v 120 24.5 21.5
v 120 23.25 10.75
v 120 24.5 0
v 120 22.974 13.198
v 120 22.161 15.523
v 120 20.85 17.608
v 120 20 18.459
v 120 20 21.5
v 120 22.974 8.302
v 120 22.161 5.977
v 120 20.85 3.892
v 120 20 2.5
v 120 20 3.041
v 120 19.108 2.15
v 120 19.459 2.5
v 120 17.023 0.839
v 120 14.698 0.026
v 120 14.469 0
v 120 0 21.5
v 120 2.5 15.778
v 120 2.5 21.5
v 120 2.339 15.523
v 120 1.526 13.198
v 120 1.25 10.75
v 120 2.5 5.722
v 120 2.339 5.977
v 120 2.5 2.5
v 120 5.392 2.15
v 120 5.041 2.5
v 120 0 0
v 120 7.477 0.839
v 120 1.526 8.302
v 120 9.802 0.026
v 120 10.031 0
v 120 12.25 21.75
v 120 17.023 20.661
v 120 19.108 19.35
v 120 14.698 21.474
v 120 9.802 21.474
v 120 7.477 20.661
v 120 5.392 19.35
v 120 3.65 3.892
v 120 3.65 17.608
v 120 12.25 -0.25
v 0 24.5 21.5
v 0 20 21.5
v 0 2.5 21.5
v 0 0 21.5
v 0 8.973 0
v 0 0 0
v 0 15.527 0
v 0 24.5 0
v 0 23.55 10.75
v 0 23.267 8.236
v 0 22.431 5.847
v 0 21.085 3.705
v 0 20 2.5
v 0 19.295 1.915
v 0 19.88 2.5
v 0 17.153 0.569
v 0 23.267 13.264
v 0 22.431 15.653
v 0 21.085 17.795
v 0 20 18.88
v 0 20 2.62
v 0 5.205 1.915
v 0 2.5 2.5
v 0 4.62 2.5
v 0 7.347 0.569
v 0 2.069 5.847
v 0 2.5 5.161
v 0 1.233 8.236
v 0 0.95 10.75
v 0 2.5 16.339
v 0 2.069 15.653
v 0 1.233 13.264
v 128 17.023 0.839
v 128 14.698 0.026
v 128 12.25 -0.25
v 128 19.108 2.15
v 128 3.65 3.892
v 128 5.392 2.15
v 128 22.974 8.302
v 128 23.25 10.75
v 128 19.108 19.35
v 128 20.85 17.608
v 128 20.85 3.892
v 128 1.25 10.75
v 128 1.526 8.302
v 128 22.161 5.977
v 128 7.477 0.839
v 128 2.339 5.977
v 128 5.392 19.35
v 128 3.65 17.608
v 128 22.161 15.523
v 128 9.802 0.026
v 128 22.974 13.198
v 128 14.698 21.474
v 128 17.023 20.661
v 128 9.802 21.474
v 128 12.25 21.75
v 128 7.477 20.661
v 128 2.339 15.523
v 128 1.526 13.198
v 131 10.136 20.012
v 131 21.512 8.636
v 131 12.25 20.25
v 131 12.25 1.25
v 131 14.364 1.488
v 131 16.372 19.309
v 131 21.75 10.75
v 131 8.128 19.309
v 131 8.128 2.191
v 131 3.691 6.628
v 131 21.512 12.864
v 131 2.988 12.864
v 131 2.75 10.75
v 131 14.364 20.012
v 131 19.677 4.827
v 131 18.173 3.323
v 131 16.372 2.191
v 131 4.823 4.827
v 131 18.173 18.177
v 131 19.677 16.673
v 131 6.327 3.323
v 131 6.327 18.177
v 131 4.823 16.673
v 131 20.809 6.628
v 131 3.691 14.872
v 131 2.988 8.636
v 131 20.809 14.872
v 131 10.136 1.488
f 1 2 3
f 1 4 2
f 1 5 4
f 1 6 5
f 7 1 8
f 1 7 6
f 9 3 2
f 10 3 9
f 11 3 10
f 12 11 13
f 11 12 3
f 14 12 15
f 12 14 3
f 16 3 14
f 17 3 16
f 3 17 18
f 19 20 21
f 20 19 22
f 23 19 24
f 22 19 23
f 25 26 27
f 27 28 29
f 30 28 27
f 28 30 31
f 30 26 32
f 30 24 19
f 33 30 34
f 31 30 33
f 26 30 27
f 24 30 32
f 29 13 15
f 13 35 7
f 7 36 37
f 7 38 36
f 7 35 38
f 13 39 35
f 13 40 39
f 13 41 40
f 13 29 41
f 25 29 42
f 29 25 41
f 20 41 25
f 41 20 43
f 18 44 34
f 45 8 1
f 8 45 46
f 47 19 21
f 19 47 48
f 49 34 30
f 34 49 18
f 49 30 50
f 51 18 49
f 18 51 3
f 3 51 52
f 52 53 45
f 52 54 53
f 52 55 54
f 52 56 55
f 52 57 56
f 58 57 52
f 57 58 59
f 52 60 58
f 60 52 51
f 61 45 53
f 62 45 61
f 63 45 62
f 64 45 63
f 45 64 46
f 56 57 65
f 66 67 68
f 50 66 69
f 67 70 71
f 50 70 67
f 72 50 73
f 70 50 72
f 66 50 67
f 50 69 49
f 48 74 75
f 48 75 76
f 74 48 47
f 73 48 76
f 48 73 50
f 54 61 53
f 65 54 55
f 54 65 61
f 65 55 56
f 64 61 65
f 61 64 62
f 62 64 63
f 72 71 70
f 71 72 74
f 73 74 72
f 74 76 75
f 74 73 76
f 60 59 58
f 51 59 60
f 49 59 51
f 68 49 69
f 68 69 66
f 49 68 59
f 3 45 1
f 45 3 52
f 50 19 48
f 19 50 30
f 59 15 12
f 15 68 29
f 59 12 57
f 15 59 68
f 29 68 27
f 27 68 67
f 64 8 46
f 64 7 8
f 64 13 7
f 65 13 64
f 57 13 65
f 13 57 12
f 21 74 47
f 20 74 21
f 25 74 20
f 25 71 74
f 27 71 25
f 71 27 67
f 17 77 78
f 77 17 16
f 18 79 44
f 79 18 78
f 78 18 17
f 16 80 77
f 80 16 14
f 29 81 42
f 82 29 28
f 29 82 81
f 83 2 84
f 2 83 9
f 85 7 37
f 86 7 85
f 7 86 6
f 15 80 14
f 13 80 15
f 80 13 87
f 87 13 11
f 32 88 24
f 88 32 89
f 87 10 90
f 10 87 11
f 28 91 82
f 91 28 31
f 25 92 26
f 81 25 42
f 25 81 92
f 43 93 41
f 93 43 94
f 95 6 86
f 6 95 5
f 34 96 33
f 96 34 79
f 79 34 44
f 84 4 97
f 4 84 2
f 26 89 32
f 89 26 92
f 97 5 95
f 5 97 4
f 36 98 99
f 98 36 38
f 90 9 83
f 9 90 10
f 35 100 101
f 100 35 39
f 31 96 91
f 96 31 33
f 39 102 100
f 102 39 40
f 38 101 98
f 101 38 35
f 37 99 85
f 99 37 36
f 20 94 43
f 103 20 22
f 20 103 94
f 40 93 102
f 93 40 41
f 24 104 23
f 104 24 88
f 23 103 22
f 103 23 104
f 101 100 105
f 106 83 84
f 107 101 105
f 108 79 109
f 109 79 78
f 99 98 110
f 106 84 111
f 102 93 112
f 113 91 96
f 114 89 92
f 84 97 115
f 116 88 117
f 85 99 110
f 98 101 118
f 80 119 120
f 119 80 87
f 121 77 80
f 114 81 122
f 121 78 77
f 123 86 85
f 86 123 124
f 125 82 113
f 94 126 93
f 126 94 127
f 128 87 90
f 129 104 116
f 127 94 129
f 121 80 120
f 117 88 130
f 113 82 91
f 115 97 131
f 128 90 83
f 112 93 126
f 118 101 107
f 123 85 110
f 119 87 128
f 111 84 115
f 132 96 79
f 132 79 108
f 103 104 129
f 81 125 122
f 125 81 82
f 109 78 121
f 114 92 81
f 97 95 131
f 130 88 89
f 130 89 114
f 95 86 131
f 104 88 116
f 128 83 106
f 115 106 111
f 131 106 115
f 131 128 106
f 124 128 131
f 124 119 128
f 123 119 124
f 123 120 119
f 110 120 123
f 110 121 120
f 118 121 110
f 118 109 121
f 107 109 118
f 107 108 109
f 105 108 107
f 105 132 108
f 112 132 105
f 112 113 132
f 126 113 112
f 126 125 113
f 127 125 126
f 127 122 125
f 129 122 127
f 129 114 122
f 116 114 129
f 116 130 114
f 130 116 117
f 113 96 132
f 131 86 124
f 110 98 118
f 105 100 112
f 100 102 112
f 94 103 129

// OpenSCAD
// Marble Run — Modular Track System
// Piece 1: Straight section (print many)
// PLA — 0.2mm, 3 walls, 15% infill, no supports
// 16mm marble compatible — set MARBLE_D to your marble size

MARBLE_D  = 16.5;  // Marble diameter + 0.5mm play
TRACK_W   = MARBLE_D + 8;
TRACK_H   = MARBLE_D + 5;
WALL_T    = 2.5;
LENGTH    = 120;
SLOPE_DEG = 5;     // Print flat; tilt during assembly for roll speed
CONNECTOR_D = 22;  // Snap connector diameter

module channel() {
    translate([0, 0, WALL_T])
        cube([LENGTH + 4, MARBLE_D + 1, MARBLE_D + 1]);
}

module connector_male() {
    cylinder(d = CONNECTOR_D, h = 8, $fn = 28);
    translate([0, 0, 8])
        cylinder(d1 = CONNECTOR_D, d2 = CONNECTOR_D - 3, h = 3, $fn = 28);
}

module connector_female() {
    cylinder(d = CONNECTOR_D + 0.6, h = 11, $fn = 28);
}

module track_body() {
    difference() {
        cube([LENGTH, TRACK_W, TRACK_H]);
        // Channel
        translate([-1, WALL_T, WALL_T])
            cube([LENGTH + 2, MARBLE_D + 1, MARBLE_D + 4]);
        // Open top (so you can see marble + easy to print)
        translate([-1, WALL_T, TRACK_H - MARBLE_D * 0.4])
            cube([LENGTH + 2, MARBLE_D + 1, MARBLE_D]);
    }
}

difference() {
    union() {
        track_body();
        // Male connector at one end
        translate([LENGTH, TRACK_W/2, TRACK_H/2])
            rotate([0, 90, 0]) connector_male();
    }
    // Female connector at other end
    translate([-11, TRACK_W/2, TRACK_H/2])
        rotate([0, 90, 0]) connector_female();
}
